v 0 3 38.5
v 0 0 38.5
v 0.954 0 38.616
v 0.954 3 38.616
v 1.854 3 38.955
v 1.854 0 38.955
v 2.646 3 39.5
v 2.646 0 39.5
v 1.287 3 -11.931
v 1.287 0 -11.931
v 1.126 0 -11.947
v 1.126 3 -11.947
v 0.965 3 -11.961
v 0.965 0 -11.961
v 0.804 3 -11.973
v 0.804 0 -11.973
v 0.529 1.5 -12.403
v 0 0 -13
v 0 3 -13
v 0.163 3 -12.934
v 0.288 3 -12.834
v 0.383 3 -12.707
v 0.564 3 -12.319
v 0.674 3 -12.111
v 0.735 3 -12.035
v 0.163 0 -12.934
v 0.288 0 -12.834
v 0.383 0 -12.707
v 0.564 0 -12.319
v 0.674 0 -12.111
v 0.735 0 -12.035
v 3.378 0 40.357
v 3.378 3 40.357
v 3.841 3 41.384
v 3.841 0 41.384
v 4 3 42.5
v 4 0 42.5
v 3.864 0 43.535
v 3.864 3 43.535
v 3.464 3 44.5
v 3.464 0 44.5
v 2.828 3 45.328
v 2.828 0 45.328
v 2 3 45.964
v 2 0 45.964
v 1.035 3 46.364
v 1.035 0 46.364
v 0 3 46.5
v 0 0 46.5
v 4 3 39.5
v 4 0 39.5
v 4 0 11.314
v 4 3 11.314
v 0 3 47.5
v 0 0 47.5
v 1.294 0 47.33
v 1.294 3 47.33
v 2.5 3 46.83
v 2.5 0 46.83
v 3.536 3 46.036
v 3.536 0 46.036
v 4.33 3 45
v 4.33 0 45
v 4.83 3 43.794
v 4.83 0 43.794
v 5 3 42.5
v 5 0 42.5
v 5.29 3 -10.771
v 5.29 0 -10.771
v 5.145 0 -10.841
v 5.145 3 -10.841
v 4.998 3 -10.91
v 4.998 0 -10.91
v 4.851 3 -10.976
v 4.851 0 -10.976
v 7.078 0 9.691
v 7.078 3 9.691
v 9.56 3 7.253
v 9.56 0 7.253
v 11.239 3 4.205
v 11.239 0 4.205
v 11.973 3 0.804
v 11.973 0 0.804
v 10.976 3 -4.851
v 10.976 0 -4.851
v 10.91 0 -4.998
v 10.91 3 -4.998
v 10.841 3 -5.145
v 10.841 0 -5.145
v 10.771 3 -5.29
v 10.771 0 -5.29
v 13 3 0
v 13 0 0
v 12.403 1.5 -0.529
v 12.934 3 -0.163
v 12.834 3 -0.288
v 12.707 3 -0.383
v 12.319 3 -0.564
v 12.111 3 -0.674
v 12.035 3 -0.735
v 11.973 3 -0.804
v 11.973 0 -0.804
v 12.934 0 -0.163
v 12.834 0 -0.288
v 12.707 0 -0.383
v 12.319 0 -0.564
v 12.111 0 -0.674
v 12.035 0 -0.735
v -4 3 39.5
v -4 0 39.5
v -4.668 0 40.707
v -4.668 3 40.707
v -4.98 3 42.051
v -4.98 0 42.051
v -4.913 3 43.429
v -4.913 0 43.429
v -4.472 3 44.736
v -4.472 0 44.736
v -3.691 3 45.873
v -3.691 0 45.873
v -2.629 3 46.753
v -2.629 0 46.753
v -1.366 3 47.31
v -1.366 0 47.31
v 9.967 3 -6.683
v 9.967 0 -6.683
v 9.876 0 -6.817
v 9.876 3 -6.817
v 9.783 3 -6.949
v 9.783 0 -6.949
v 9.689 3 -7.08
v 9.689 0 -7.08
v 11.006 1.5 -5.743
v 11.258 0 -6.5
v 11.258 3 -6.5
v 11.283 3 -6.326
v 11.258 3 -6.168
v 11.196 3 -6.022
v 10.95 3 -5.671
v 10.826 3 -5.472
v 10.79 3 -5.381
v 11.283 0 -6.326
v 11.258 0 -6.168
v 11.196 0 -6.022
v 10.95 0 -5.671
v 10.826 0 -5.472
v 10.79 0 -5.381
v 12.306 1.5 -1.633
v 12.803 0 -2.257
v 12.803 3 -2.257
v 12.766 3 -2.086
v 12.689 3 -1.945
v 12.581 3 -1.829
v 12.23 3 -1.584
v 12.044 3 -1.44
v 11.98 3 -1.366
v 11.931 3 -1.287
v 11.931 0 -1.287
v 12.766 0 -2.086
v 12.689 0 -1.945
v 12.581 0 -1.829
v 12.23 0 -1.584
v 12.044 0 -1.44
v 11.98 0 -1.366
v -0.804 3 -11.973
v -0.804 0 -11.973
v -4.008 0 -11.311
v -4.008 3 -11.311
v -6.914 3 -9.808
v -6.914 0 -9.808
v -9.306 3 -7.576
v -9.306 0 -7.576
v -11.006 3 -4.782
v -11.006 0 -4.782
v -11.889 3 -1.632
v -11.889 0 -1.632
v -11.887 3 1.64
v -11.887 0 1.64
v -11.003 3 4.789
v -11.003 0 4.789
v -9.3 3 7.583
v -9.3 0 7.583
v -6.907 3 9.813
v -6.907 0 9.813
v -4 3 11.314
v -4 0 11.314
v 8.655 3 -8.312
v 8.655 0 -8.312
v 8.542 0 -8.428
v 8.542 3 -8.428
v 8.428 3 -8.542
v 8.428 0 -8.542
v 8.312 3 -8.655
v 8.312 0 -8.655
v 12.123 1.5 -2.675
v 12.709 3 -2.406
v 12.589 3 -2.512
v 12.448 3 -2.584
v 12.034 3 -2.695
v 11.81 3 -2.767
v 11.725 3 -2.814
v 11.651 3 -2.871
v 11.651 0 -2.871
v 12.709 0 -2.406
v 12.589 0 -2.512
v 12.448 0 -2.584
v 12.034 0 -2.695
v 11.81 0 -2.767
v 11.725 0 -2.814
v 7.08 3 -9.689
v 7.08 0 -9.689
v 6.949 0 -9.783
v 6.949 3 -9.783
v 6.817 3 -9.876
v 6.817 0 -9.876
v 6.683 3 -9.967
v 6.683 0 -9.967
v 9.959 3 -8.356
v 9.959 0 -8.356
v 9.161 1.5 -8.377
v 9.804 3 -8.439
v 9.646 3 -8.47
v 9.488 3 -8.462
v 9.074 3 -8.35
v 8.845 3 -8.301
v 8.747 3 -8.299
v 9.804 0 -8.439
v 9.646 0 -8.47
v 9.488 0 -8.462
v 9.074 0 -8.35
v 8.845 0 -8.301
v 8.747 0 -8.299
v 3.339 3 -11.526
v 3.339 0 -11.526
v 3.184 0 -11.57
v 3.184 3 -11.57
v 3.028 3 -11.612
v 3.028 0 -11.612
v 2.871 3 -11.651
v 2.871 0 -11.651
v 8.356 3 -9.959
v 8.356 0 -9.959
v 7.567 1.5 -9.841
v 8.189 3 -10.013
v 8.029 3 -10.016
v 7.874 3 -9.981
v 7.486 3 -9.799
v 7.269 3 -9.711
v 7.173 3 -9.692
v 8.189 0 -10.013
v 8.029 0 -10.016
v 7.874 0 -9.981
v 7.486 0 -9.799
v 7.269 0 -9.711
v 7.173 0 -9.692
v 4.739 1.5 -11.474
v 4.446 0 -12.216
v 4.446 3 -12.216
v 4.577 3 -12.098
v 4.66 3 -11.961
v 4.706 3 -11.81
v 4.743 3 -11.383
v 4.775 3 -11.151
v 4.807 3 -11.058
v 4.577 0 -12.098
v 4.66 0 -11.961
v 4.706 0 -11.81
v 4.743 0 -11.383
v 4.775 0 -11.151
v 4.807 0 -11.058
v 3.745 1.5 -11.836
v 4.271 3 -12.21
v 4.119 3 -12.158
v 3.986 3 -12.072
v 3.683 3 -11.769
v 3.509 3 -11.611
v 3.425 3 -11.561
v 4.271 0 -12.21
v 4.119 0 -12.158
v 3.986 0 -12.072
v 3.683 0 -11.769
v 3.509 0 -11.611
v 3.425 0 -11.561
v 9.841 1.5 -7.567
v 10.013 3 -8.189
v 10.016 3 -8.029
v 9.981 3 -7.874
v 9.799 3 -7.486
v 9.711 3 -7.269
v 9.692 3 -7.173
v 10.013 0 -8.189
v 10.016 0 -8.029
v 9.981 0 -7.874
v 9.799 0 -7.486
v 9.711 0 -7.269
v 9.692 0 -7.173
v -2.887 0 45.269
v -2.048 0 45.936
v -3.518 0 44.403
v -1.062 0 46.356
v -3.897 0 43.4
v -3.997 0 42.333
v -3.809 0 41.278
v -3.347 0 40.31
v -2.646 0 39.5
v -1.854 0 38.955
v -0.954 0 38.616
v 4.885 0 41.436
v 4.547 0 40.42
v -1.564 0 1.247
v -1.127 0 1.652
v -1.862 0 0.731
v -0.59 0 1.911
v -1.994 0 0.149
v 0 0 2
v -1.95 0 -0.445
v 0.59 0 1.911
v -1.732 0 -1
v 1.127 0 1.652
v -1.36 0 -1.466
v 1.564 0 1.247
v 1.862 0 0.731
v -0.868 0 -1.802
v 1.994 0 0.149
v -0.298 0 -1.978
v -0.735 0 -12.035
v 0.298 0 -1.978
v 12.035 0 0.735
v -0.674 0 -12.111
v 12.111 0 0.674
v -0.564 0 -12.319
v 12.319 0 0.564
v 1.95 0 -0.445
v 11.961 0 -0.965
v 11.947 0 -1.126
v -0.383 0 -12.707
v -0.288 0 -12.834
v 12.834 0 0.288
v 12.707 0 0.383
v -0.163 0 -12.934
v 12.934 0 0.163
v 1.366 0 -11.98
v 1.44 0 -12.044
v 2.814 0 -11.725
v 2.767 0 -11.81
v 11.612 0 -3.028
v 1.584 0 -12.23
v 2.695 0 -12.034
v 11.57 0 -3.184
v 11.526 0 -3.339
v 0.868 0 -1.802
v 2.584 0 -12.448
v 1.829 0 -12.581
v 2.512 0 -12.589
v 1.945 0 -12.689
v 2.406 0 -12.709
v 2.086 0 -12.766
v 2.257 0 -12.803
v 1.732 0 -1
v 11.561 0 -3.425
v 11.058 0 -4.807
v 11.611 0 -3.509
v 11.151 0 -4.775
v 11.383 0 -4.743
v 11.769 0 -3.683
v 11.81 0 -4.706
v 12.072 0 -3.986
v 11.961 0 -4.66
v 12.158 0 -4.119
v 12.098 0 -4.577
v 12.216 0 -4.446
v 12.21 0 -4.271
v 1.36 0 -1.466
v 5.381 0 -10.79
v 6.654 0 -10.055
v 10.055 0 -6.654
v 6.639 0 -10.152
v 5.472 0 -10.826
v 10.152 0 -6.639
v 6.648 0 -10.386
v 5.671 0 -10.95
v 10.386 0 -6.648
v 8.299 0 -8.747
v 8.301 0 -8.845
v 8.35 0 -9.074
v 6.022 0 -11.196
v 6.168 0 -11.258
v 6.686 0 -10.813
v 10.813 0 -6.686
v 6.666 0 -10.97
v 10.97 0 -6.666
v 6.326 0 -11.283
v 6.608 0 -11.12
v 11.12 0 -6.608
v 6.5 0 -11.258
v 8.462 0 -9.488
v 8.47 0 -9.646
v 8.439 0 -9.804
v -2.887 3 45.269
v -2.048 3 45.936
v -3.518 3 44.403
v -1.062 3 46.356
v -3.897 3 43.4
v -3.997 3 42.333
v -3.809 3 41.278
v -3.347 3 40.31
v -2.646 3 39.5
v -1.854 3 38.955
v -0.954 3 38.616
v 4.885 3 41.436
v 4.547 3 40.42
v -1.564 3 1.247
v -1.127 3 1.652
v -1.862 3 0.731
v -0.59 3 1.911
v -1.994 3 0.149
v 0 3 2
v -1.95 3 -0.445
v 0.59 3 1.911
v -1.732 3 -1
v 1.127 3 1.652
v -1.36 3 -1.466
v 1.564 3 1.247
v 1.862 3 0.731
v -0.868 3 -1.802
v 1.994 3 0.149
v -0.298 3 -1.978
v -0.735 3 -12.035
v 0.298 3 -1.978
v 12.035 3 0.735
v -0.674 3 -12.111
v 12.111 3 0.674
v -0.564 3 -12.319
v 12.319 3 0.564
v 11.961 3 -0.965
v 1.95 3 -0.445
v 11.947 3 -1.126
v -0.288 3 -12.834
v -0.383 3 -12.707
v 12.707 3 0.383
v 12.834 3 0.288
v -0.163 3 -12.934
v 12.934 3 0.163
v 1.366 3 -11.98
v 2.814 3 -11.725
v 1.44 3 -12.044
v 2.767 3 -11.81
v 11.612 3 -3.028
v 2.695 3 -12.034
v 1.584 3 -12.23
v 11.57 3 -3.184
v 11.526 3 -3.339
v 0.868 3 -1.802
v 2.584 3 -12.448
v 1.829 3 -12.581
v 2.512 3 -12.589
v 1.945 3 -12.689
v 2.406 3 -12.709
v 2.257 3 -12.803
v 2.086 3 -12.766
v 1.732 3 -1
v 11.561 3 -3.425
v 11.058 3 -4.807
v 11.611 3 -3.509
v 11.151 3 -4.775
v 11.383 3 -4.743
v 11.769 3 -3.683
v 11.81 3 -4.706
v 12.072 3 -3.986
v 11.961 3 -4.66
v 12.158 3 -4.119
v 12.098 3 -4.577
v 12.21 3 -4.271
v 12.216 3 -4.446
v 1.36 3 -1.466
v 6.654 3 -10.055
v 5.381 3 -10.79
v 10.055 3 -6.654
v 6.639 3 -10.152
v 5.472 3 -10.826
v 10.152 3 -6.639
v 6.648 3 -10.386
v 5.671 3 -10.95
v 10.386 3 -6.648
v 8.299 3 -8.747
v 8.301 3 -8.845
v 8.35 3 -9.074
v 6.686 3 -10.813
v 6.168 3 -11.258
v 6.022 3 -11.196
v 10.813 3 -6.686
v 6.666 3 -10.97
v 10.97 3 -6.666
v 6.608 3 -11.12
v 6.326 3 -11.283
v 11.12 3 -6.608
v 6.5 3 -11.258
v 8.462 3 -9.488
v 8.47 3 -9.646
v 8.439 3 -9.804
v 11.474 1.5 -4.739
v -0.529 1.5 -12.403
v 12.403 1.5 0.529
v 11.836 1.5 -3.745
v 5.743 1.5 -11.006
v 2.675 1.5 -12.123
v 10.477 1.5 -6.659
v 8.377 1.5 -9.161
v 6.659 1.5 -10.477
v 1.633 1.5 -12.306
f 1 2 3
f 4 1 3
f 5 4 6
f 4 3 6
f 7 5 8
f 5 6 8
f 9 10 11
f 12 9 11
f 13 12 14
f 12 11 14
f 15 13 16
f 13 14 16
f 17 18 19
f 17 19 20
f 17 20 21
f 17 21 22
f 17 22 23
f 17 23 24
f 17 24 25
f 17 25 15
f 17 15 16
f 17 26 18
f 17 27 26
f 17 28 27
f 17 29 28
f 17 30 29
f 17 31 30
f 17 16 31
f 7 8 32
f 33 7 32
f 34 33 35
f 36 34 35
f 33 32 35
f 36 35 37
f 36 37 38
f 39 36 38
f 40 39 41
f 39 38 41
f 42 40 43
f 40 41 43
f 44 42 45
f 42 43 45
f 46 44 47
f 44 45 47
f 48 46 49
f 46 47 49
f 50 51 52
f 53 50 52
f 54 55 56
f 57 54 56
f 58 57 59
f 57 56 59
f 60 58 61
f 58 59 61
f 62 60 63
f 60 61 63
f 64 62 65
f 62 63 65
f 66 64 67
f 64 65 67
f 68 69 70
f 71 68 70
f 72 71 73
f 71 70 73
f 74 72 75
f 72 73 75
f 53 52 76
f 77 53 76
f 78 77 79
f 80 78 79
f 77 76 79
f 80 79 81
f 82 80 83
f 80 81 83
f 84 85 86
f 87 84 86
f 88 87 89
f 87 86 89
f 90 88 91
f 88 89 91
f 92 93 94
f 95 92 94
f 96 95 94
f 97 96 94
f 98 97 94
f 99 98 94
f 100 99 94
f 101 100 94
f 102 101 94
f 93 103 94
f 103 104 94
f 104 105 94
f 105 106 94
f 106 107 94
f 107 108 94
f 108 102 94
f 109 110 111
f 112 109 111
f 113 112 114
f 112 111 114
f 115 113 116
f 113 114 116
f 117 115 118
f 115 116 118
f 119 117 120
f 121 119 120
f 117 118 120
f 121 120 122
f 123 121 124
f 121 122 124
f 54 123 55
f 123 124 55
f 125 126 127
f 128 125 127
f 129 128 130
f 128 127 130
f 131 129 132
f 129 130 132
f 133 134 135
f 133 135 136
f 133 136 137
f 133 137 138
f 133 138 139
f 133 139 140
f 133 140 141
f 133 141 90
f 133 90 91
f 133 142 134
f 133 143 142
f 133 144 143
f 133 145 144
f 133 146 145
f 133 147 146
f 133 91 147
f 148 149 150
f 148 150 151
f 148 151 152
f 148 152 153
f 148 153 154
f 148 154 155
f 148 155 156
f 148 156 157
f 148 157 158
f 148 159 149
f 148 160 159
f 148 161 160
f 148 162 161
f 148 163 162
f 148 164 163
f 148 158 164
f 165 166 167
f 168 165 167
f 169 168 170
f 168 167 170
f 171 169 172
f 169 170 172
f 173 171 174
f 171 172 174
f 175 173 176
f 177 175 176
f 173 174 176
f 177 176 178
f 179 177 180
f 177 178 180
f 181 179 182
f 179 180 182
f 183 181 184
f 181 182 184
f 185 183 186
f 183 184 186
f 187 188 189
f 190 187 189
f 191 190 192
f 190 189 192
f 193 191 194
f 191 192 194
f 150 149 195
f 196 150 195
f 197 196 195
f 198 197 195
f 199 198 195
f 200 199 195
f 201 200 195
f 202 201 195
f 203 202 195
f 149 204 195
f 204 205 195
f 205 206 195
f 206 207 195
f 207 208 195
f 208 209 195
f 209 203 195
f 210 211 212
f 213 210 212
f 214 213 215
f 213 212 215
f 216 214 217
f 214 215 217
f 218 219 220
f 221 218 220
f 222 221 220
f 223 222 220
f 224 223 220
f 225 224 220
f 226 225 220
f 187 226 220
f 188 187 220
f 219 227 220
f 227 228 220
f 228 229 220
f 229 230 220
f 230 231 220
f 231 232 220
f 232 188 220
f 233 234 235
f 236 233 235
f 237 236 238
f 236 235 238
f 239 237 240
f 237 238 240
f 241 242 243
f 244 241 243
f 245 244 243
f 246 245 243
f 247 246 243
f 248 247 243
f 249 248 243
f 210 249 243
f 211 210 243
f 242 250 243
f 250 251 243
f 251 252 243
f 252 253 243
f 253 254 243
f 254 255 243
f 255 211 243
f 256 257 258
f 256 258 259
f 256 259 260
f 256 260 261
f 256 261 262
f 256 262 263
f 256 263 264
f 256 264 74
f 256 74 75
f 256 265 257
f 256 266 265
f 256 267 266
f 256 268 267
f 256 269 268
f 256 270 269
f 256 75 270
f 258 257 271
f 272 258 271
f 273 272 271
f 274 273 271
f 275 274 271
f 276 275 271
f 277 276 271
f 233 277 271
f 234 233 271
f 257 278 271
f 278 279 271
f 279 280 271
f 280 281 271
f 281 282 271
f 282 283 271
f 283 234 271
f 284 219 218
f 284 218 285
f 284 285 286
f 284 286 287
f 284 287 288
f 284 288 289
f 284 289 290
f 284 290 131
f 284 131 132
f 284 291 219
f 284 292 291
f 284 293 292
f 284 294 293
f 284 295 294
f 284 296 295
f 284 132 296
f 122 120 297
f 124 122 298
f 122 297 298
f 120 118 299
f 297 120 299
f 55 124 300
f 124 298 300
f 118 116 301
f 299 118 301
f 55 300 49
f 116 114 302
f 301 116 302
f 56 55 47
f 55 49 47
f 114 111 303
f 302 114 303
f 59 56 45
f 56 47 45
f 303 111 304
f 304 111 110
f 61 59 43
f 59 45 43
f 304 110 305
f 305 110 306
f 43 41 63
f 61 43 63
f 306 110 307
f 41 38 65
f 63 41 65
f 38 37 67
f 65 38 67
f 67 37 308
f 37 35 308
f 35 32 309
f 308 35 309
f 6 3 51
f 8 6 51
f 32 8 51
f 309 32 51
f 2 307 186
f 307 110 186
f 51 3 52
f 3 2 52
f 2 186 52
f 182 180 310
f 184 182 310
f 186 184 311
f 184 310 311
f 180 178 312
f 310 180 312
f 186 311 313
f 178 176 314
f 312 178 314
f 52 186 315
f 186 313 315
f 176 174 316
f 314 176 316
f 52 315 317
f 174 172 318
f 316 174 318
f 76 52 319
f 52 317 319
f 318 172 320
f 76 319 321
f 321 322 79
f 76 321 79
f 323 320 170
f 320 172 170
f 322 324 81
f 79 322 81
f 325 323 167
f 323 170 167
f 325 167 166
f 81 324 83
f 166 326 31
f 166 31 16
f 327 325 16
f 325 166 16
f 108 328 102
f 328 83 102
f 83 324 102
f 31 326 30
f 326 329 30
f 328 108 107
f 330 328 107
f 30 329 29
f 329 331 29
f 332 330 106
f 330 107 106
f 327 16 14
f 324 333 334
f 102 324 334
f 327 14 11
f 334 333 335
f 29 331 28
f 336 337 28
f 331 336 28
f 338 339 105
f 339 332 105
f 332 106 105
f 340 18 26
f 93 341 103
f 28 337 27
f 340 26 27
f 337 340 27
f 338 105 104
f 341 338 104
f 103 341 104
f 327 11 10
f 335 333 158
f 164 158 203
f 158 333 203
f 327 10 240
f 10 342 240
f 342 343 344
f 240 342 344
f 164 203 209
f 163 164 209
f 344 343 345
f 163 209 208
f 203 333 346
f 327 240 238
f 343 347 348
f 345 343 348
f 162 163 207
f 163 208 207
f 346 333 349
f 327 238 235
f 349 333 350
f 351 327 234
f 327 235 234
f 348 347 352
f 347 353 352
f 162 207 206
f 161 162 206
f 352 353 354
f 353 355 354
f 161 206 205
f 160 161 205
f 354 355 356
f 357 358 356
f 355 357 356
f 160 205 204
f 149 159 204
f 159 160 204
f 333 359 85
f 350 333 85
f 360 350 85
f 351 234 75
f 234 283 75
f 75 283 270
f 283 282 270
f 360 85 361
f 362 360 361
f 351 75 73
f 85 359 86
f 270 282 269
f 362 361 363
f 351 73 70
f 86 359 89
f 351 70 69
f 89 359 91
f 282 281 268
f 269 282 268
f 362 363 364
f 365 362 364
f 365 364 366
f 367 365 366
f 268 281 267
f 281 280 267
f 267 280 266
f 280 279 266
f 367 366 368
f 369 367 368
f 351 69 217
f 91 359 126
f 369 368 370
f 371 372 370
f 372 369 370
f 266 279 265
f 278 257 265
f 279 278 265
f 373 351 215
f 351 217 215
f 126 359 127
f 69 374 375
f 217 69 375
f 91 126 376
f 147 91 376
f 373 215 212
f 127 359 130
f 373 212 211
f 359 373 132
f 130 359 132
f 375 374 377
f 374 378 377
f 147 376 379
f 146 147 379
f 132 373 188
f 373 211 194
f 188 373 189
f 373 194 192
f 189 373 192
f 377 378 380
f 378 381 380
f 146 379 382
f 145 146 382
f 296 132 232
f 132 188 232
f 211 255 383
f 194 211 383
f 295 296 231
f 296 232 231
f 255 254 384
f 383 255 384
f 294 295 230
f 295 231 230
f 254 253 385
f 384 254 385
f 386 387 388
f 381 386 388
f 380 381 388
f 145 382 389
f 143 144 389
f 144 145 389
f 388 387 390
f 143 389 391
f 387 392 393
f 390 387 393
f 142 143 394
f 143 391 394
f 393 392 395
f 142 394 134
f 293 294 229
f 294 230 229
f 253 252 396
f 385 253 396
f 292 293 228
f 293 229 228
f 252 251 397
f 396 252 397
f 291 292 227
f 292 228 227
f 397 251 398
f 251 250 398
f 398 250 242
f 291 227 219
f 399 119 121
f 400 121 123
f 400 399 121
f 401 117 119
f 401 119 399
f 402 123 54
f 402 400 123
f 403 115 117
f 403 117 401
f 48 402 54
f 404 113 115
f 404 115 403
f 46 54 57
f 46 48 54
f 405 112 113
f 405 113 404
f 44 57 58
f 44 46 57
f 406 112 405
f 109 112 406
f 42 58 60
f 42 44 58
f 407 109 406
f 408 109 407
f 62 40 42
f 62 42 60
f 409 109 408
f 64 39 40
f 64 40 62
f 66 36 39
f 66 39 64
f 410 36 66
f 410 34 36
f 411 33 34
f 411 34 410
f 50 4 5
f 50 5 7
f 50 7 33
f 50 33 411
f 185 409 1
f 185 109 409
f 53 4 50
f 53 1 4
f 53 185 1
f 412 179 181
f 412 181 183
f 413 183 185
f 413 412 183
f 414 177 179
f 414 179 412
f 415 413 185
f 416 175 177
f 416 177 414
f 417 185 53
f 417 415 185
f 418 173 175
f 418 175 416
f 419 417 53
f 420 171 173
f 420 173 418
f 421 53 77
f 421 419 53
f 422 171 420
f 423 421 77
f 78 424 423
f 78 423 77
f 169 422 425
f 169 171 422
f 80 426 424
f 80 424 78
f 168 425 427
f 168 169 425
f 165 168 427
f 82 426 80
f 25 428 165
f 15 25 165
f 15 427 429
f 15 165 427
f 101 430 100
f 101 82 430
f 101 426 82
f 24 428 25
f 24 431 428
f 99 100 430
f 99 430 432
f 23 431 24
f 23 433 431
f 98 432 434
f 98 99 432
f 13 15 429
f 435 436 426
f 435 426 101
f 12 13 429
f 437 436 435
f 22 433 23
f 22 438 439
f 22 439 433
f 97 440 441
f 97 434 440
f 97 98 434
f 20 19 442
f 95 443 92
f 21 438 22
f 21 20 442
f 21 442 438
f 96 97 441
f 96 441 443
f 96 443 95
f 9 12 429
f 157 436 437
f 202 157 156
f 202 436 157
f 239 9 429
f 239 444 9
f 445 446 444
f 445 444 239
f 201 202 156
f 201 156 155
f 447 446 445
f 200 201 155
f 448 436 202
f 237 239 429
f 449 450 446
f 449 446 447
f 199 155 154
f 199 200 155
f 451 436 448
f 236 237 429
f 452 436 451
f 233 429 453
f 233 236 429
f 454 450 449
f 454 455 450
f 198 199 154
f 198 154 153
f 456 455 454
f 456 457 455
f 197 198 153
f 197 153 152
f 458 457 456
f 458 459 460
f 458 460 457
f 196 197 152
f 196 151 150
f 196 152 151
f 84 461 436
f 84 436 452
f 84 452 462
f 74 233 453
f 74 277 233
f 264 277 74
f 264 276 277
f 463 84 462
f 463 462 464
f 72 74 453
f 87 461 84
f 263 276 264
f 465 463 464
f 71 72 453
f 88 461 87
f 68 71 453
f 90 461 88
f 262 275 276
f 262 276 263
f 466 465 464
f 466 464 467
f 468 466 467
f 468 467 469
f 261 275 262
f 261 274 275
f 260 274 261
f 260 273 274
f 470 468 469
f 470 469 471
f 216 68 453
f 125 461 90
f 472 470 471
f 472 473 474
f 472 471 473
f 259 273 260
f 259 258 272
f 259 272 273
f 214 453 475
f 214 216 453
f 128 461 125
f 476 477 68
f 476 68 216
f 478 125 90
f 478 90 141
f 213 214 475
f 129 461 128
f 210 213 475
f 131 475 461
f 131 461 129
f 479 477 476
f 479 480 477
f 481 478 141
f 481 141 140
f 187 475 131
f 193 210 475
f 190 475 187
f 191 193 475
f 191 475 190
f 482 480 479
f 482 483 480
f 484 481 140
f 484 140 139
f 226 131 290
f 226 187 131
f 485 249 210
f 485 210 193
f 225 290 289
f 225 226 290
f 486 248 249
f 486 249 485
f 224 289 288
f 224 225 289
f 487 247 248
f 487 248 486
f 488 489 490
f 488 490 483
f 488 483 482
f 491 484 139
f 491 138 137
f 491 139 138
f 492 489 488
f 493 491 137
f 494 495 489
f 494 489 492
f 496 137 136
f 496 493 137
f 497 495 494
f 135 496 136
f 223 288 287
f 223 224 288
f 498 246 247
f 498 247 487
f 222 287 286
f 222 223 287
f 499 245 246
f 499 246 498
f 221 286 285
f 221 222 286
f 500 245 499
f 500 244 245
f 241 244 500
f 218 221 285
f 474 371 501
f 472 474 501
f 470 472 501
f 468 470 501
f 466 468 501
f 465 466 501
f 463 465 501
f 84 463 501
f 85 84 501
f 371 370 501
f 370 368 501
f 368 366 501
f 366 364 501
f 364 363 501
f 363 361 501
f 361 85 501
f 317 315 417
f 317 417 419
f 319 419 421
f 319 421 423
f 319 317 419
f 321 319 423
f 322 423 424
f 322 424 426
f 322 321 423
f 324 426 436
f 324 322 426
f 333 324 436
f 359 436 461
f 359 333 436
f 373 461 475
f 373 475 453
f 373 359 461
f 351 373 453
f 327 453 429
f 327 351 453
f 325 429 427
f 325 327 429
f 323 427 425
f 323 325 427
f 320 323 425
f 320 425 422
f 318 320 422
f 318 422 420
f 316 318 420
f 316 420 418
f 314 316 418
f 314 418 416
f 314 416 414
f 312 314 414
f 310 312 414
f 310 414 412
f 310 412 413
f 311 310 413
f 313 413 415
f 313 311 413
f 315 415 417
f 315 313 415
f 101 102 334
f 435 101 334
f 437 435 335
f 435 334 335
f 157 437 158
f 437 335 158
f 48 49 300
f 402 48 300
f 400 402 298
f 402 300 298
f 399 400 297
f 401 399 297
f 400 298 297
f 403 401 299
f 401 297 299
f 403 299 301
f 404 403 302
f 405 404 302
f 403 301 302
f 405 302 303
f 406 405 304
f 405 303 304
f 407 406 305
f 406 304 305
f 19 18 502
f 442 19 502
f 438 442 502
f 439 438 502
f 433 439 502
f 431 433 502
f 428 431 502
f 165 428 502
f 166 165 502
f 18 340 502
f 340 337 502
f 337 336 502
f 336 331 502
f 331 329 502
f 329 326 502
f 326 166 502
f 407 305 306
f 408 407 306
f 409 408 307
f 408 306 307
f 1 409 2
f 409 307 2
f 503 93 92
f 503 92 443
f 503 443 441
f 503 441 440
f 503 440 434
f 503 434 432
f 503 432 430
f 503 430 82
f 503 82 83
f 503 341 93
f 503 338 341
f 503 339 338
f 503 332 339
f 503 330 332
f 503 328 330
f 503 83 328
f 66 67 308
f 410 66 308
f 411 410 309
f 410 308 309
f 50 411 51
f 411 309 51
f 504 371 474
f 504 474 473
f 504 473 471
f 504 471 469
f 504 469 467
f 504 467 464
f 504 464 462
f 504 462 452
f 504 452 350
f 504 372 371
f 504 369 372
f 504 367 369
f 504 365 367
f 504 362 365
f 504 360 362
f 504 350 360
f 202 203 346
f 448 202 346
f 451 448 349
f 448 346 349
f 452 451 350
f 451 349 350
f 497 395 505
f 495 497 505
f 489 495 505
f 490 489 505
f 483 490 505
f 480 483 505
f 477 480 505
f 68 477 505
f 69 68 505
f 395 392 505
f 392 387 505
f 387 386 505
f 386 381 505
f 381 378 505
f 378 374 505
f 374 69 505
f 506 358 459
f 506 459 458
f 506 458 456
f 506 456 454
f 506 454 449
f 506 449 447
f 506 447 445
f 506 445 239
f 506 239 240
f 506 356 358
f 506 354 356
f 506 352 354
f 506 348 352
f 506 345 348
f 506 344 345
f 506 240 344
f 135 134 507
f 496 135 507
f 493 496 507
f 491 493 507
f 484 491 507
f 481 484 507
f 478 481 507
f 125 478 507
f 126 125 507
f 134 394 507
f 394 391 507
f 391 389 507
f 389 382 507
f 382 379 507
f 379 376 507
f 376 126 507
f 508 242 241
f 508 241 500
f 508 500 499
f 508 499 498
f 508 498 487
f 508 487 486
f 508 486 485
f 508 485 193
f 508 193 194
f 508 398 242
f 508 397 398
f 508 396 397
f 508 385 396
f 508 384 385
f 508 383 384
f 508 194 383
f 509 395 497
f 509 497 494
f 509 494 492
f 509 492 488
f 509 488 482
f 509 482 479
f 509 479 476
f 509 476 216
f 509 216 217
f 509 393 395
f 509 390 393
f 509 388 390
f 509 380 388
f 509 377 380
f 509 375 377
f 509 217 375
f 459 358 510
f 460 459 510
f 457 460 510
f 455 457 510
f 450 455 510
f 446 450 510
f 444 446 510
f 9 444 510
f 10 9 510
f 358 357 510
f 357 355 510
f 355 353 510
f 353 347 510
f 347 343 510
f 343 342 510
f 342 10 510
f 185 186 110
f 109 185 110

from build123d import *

# Parameters (mm, degrees)
SKETCH_1_R      = 2
EXTRUDE_1_DEPTH = 3
EXTRUDE_START   = -3
EXTRUDE_2_DEPTH = 3


with BuildPart() as part:
    # 草图1 → 凸台-拉伸1 (new body)
    with BuildSketch(Plane(origin=(0, 0, 0), x_dir=(1, 0, 0), z_dir=(0, 1, 0))):
        with BuildLine():
            ThreePointArc((-0.804164412, 11.973024664), (-8.485281374, -8.485281374), (11.973024664, -0.804164412))
            add(Edge.make_bspline(
                [(13, 0), (12.923284361, -0.311828909), (12.495573917, -0.491752354), (12.082770065, -0.660295948), (11.973024664, -0.804164412)],
                knots=[0, 0, 0, 0, 0.61500276, 1, 1, 1, 1], degree=3))
            add(Edge.make_bspline(
                [(13, 0), (12.923284361, 0.311828909), (12.495573917, 0.491752354), (12.082770065, 0.660295948), (11.973024664, 0.804164412)],
                knots=[0, 0, 0, 0, 0.61500276, 1, 1, 1, 1], degree=3))
            ThreePointArc((11.973024664, 0.804164412), (11.954336377, 1.045868913), (11.930769201, 1.287146566))
            add(Edge.make_bspline(
                [(12.802500789, 2.25742631), (12.781099155, 1.937013252), (12.391129972, 1.685552109), (12.013864826, 1.447886434), (11.930769201, 1.287146566)],
                knots=[0, 0, 0, 0, 0.61500276, 1, 1, 1, 1], degree=3))
            add(Edge.make_bspline(
                [(12.802500789, 2.25742631), (12.672802111, 2.551196306), (12.220346171, 2.65411517), (11.78454645, 2.748415572), (11.651485831, 2.871041262)],
                knots=[0, 0, 0, 0, 0.61500276, 1, 1, 1, 1], degree=3))
            ThreePointArc((11.651485831, 2.871041262), (11.591109915, 3.105828541), (11.526003353, 3.339348247))
            add(Edge.make_bspline(
                [(12.21600407, 4.446261863), (12.250566718, 4.127000245), (11.910187813, 3.811641924), (11.579924383, 3.51207552), (11.526003353, 3.339348247)],
                knots=[0, 0, 0, 0, 0.61500276, 1, 1, 1, 1], degree=3))
            add(Edge.make_bspline(
                [(12.21600407, 4.446261863), (12.037263182, 4.713046894), (11.573809391, 4.73583404), (11.128255354, 4.753025979), (10.975922497, 4.850682976)],
                knots=[0, 0, 0, 0, 0.61500276, 1, 1, 1, 1], degree=3))
            ThreePointArc((10.975922497, 4.850682976), (10.875693444, 5.071419141), (10.771025725, 5.290085522))
            add(Edge.make_bspline(
                [(11.258330249, 6.5), (11.347807011, 6.191590424), (11.067360624, 5.821916927), (10.794133798, 5.469551968), (10.771025725, 5.290085522)],
                knots=[0, 0, 0, 0, 0.61500276, 1, 1, 1, 1], degree=3))
            add(Edge.make_bspline(
                [(11.258330249, 6.5), (11.035978102, 6.731693937), (10.57560827, 6.673656989), (10.13383785, 6.613218097), (9.966861313, 6.682939142)],
                knots=[0, 0, 0, 0, 0.61500276, 1, 1, 1, 1], degree=3))
            ThreePointArc((9.966861313, 6.682939142), (9.829824531, 6.882917236), (9.688775931, 7.080086225))
            add(Edge.make_bspline(
                [(9.958577761, 8.356238926), (10.10024993, 8.068052261), (9.888257283, 7.655295931), (9.68036892, 7.260838847), (9.688775931, 7.080086225)],
                knots=[0, 0, 0, 0, 0.61500276, 1, 1, 1, 1], degree=3))
            add(Edge.make_bspline(
                [(9.958577761, 8.356238926), (9.699370412, 8.545801866), (9.256072642, 8.408704248), (8.831508812, 8.27247093), (8.654962091, 8.312137584)],
                knots=[0, 0, 0, 0, 0.61500276, 1, 1, 1, 1], degree=3))
            ThreePointArc((8.654962091, 8.312137584), (8.485281374, 8.485281374), (8.312137584, 8.654962091))
            add(Edge.make_bspline(
                [(8.356238926, 9.958577761), (8.545801866, 9.699370412), (8.408704248, 9.256072642), (8.27247093, 8.831508812), (8.312137584, 8.654962091)],
                knots=[0, 0, 0, 0, 0.61500276, 1, 1, 1, 1], degree=3))
            add(Edge.make_bspline(
                [(8.356238926, 9.958577761), (8.068052261, 10.10024993), (7.655295931, 9.888257283), (7.260838847, 9.68036892), (7.080086225, 9.688775931)],
                knots=[0, 0, 0, 0, 0.61500276, 1, 1, 1, 1], degree=3))
            ThreePointArc((7.080086225, 9.688775931), (6.882917236, 9.829824531), (6.682939142, 9.966861313))
            add(Edge.make_bspline(
                [(6.5, 11.258330249), (6.731693937, 11.035978102), (6.673656989, 10.57560827), (6.613218097, 10.13383785), (6.682939142, 9.966861313)],
                knots=[0, 0, 0, 0, 0.61500276, 1, 1, 1, 1], degree=3))
            add(Edge.make_bspline(
                [(6.5, 11.258330249), (6.191590424, 11.347807011), (5.821916927, 11.067360624), (5.469551968, 10.794133798), (5.290085522, 10.771025725)],
                knots=[0, 0, 0, 0, 0.61500276, 1, 1, 1, 1], degree=3))
            ThreePointArc((5.290085522, 10.771025725), (5.071419141, 10.875693444), (4.850682976, 10.975922497))
            add(Edge.make_bspline(
                [(4.446261863, 12.21600407), (4.713046894, 12.037263182), (4.73583404, 11.573809391), (4.753025979, 11.128255354), (4.850682976, 10.975922497)],
                knots=[0, 0, 0, 0, 0.61500276, 1, 1, 1, 1], degree=3))
            add(Edge.make_bspline(
                [(4.446261863, 12.21600407), (4.127000245, 12.250566718), (3.811641924, 11.910187813), (3.51207552, 11.579924383), (3.339348247, 11.526003353)],
                knots=[0, 0, 0, 0, 0.61500276, 1, 1, 1, 1], degree=3))
            ThreePointArc((3.339348247, 11.526003353), (3.105828541, 11.591109915), (2.871041262, 11.651485831))
            add(Edge.make_bspline(
                [(2.25742631, 12.802500789), (2.551196306, 12.672802111), (2.65411517, 12.220346171), (2.748415572, 11.78454645), (2.871041262, 11.651485831)],
                knots=[0, 0, 0, 0, 0.61500276, 1, 1, 1, 1], degree=3))
            add(Edge.make_bspline(
                [(2.25742631, 12.802500789), (1.937013252, 12.781099155), (1.685552109, 12.391129972), (1.447886434, 12.013864826), (1.287146566, 11.930769201)],
                knots=[0, 0, 0, 0, 0.61500276, 1, 1, 1, 1], degree=3))
            ThreePointArc((1.287146566, 11.930769201), (1.045868913, 11.954336377), (0.804164412, 11.973024664))
            add(Edge.make_bspline(
                [(0, 13), (0.311828909, 12.923284361), (0.491752354, 12.495573917), (0.660295948, 12.082770065), (0.804164412, 11.973024664)],
                knots=[0, 0, 0, 0, 0.61500276, 1, 1, 1, 1], degree=3))
            add(Edge.make_bspline(
                [(0, 13), (-0.311828909, 12.923284361), (-0.491752354, 12.495573917), (-0.660295948, 12.082770065), (-0.804164412, 11.973024664)],
                knots=[0, 0, 0, 0, 0.61500276, 1, 1, 1, 1], degree=3))
        make_face()
        with Locations(Location((0, 0, 0), (0, 0, 270))):
            Circle(SKETCH_1_R, mode=Mode.SUBTRACT)
    extrude(amount=EXTRUDE_1_DEPTH)

    # 草图2 → 凸台-拉伸2 (add)
    with BuildSketch(Plane(origin=(0, 3, 0), x_dir=(1, 0, 0), z_dir=(0, 1, 0)).offset(EXTRUDE_START)):
        with BuildLine():
            ThreePointArc((4, -11.313708499), (2.029223745, -11.827182716), (0, -12))
            Line((0, -12), (0, -37.5))
            ThreePointArc((0, -37.5), (2.236067977, -38.027864045), (4, -39.5))
            Line((4, -39.5), (4, -11.313708499))
        make_face()
        with BuildLine():
            Line((0, -37.5), (0, -12))
            ThreePointArc((0, -12), (-2.029223745, -11.827182716), (-4, -11.313708499))
            Line((-4, -11.313708499), (-4, -39.5))
            ThreePointArc((-4, -39.5), (-2.236067977, -38.027864045), (0, -37.5))
        make_face()
        with BuildLine():
            ThreePointArc((4, -39.5), (2.236067977, -38.027864045), (0, -37.5))
            Line((0, -37.5), (0, -38.5))
            ThreePointArc((0, -38.5), (1.414213562, -38.758342613), (2.645751311, -39.5))
            Line((2.645751311, -39.5), (4, -39.5))
        make_face()
        with BuildLine():
            Line((0, -38.5), (0, -37.5))
            ThreePointArc((0, -37.5), (-2.236067977, -38.027864045), (-4, -39.5))
            Line((-4, -39.5), (-2.645751311, -39.5))
            ThreePointArc((-2.645751311, -39.5), (-1.414213562, -38.758342613), (0, -38.5))
        make_face()
        with BuildLine():
            ThreePointArc((5, -42.5), (4.74341649, -40.91886117), (4, -39.5))
            Line((4, -39.5), (2.645751311, -39.5))
            ThreePointArc((2.645751311, -39.5), (3.645751311, -40.854248689), (4, -42.5))
            ThreePointArc((4, -42.5), (2.828427125, -45.328427125), (0, -46.5))
            Line((0, -46.5), (0, -47.5))
            ThreePointArc((0, -47.5), (3.535533906, -46.035533906), (5, -42.5))
        make_face()
        with BuildLine():
            Line((-2.645751311, -39.5), (-4, -39.5))
            ThreePointArc((-4, -39.5), (-4.472135955, -44.736067977), (0, -47.5))
            Line((0, -47.5), (0, -46.5))
            ThreePointArc((0, -46.5), (-3.741657387, -43.914213562), (-2.645751311, -39.5))
        make_face()
    extrude(amount=EXTRUDE_2_DEPTH)


solid = part.part
